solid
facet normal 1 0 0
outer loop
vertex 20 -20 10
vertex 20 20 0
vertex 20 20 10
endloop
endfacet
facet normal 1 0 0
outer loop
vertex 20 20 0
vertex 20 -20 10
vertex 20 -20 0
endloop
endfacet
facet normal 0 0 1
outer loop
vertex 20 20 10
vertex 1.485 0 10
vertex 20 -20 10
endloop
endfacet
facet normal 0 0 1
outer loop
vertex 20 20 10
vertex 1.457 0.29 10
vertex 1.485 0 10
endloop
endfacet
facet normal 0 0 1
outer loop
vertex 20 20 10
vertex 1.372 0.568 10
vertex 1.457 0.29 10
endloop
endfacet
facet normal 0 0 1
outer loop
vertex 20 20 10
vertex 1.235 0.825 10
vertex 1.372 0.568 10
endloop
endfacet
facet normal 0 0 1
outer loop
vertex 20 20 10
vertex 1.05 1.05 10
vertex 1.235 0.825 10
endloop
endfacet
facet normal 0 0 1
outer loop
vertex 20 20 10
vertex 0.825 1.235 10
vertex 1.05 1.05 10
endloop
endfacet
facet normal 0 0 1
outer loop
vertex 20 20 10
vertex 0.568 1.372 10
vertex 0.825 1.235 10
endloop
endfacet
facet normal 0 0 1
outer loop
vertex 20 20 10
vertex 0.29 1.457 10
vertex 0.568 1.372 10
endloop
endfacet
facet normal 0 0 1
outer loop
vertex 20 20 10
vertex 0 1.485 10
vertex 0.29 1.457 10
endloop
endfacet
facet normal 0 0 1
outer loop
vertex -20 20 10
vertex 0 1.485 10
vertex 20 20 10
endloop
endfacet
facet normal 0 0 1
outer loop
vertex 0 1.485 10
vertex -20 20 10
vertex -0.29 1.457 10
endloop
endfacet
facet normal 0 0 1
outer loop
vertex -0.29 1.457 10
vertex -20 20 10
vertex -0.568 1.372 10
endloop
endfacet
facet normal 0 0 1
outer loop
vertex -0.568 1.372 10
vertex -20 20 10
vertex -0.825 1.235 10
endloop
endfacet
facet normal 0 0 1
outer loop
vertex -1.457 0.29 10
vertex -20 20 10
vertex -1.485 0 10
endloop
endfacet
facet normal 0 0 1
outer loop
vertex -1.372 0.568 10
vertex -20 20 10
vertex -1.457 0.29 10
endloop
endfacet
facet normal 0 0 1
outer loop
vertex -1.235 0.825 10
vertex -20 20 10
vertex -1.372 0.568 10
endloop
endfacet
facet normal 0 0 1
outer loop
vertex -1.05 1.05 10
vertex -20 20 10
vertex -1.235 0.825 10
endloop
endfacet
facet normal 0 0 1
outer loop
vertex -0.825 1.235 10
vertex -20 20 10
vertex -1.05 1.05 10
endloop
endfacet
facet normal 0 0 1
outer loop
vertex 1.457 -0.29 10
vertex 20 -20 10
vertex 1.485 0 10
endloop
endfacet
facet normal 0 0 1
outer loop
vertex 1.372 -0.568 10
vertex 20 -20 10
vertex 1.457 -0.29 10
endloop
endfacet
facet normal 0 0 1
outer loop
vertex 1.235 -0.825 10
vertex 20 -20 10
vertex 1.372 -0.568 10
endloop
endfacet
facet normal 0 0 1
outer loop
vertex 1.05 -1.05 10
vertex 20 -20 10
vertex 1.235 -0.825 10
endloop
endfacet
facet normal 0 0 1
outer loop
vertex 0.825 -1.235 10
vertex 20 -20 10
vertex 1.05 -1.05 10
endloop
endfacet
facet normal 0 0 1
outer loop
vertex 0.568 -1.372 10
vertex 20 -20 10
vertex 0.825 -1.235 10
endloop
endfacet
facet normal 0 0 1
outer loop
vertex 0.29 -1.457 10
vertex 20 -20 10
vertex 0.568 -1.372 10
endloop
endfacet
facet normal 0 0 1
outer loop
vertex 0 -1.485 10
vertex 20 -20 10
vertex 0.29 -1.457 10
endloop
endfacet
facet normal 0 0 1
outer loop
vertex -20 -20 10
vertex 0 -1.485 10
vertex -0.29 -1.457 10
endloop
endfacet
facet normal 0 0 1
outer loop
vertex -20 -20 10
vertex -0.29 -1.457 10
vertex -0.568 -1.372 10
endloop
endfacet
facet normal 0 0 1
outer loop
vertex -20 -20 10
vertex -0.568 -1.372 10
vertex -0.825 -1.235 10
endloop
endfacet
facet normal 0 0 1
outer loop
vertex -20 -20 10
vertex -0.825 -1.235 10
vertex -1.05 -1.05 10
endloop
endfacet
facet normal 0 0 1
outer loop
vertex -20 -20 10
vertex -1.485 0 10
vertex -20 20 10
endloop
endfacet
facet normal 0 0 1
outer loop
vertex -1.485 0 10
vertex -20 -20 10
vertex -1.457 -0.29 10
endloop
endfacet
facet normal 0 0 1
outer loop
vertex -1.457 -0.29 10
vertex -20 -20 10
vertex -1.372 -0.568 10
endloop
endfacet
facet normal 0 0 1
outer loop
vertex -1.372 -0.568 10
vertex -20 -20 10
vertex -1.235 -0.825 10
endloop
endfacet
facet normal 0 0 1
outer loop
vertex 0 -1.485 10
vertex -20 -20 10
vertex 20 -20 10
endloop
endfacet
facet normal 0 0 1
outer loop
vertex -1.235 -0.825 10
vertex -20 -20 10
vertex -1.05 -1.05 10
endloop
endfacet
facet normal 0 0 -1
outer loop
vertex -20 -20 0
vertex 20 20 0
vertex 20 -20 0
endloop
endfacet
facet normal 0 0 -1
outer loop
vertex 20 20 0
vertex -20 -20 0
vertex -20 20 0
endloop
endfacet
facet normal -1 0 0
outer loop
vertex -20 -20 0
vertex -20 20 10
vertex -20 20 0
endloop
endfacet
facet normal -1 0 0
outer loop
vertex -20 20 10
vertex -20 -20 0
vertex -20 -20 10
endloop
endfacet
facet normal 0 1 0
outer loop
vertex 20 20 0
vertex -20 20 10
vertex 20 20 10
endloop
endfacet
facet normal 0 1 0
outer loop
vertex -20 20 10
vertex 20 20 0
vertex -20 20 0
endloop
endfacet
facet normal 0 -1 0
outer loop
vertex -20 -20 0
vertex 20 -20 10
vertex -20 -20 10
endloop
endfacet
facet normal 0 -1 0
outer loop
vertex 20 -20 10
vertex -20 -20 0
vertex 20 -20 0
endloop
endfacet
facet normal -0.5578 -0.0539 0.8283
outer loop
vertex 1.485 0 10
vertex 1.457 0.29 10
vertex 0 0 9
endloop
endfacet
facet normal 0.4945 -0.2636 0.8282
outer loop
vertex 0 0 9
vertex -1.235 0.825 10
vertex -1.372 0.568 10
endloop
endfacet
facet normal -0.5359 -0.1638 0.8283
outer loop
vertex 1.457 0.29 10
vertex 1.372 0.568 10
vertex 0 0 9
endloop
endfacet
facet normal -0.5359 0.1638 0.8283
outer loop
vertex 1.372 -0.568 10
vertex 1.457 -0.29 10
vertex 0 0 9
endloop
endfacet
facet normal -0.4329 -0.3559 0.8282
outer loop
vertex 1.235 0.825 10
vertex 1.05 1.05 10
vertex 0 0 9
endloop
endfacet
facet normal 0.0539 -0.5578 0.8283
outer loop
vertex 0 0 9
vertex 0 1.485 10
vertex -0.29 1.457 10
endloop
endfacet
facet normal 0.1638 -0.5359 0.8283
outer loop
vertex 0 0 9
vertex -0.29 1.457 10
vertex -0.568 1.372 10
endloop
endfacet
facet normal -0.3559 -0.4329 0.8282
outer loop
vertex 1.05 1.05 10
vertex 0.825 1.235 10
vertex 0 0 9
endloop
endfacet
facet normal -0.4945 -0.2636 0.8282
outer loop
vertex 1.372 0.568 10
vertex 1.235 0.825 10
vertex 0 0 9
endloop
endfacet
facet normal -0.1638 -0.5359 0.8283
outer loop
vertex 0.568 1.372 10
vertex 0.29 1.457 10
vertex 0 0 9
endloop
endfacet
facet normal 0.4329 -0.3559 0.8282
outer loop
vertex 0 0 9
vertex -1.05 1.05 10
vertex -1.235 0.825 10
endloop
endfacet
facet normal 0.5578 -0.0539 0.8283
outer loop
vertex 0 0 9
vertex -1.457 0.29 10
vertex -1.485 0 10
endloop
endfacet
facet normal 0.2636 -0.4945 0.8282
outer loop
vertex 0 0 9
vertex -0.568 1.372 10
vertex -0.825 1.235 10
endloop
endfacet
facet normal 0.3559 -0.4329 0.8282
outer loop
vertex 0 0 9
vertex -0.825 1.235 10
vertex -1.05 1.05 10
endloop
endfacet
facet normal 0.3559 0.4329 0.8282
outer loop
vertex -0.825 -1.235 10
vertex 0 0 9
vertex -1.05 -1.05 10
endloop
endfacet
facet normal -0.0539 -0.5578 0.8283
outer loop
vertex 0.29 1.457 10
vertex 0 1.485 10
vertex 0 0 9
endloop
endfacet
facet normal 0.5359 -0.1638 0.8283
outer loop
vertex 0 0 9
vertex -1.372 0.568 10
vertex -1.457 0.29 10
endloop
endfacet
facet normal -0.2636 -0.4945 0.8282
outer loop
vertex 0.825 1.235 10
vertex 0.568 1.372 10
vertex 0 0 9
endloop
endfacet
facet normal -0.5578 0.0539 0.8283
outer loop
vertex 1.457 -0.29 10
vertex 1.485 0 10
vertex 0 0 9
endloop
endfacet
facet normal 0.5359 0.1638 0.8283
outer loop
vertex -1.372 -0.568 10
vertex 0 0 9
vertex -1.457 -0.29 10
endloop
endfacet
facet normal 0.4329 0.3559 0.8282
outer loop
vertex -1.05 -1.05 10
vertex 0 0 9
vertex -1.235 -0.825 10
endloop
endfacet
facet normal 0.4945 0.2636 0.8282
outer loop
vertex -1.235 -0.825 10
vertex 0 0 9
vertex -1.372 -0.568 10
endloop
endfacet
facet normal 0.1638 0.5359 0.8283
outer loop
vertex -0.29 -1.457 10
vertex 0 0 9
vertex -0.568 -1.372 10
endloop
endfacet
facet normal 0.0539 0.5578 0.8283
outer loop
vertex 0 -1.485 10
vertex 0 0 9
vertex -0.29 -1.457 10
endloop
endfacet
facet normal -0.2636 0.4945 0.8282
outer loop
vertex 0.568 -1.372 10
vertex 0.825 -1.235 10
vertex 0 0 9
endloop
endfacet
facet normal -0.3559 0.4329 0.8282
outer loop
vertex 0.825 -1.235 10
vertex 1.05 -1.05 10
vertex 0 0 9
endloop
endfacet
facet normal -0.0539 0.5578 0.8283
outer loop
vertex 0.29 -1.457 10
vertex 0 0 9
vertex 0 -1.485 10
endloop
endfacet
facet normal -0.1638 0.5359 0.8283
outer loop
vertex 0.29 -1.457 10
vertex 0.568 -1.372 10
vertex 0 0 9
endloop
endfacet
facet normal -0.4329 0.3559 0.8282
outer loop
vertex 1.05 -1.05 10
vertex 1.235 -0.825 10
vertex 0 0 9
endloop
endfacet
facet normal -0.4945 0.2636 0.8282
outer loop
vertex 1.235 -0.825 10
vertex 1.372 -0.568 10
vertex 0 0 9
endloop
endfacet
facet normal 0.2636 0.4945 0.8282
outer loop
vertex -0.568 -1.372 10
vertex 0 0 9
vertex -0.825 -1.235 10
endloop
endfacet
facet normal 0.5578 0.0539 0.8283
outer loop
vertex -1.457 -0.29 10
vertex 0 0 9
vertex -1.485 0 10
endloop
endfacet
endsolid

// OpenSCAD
// Camera calibration block for the Scrubnurse cell: 40 x 40 x 10 mm, print it in matte black.
// The camera finds it as a dark square on the table; a shallow cone at the top centre
// guides the pointer tip. Set dimple_depth = 0 for a plain block.
size = 40;
height = 10;
dimple_diameter = 3;
dimple_depth = 1;

difference() {
    translate([-size / 2, -size / 2, 0]) cube([size, size, height]);
    if (dimple_depth > 0)
        translate([0, 0, height - dimple_depth])
            cylinder(h = dimple_depth + 0.01, d1 = 0, d2 = dimple_diameter, $fn = 32);
}
